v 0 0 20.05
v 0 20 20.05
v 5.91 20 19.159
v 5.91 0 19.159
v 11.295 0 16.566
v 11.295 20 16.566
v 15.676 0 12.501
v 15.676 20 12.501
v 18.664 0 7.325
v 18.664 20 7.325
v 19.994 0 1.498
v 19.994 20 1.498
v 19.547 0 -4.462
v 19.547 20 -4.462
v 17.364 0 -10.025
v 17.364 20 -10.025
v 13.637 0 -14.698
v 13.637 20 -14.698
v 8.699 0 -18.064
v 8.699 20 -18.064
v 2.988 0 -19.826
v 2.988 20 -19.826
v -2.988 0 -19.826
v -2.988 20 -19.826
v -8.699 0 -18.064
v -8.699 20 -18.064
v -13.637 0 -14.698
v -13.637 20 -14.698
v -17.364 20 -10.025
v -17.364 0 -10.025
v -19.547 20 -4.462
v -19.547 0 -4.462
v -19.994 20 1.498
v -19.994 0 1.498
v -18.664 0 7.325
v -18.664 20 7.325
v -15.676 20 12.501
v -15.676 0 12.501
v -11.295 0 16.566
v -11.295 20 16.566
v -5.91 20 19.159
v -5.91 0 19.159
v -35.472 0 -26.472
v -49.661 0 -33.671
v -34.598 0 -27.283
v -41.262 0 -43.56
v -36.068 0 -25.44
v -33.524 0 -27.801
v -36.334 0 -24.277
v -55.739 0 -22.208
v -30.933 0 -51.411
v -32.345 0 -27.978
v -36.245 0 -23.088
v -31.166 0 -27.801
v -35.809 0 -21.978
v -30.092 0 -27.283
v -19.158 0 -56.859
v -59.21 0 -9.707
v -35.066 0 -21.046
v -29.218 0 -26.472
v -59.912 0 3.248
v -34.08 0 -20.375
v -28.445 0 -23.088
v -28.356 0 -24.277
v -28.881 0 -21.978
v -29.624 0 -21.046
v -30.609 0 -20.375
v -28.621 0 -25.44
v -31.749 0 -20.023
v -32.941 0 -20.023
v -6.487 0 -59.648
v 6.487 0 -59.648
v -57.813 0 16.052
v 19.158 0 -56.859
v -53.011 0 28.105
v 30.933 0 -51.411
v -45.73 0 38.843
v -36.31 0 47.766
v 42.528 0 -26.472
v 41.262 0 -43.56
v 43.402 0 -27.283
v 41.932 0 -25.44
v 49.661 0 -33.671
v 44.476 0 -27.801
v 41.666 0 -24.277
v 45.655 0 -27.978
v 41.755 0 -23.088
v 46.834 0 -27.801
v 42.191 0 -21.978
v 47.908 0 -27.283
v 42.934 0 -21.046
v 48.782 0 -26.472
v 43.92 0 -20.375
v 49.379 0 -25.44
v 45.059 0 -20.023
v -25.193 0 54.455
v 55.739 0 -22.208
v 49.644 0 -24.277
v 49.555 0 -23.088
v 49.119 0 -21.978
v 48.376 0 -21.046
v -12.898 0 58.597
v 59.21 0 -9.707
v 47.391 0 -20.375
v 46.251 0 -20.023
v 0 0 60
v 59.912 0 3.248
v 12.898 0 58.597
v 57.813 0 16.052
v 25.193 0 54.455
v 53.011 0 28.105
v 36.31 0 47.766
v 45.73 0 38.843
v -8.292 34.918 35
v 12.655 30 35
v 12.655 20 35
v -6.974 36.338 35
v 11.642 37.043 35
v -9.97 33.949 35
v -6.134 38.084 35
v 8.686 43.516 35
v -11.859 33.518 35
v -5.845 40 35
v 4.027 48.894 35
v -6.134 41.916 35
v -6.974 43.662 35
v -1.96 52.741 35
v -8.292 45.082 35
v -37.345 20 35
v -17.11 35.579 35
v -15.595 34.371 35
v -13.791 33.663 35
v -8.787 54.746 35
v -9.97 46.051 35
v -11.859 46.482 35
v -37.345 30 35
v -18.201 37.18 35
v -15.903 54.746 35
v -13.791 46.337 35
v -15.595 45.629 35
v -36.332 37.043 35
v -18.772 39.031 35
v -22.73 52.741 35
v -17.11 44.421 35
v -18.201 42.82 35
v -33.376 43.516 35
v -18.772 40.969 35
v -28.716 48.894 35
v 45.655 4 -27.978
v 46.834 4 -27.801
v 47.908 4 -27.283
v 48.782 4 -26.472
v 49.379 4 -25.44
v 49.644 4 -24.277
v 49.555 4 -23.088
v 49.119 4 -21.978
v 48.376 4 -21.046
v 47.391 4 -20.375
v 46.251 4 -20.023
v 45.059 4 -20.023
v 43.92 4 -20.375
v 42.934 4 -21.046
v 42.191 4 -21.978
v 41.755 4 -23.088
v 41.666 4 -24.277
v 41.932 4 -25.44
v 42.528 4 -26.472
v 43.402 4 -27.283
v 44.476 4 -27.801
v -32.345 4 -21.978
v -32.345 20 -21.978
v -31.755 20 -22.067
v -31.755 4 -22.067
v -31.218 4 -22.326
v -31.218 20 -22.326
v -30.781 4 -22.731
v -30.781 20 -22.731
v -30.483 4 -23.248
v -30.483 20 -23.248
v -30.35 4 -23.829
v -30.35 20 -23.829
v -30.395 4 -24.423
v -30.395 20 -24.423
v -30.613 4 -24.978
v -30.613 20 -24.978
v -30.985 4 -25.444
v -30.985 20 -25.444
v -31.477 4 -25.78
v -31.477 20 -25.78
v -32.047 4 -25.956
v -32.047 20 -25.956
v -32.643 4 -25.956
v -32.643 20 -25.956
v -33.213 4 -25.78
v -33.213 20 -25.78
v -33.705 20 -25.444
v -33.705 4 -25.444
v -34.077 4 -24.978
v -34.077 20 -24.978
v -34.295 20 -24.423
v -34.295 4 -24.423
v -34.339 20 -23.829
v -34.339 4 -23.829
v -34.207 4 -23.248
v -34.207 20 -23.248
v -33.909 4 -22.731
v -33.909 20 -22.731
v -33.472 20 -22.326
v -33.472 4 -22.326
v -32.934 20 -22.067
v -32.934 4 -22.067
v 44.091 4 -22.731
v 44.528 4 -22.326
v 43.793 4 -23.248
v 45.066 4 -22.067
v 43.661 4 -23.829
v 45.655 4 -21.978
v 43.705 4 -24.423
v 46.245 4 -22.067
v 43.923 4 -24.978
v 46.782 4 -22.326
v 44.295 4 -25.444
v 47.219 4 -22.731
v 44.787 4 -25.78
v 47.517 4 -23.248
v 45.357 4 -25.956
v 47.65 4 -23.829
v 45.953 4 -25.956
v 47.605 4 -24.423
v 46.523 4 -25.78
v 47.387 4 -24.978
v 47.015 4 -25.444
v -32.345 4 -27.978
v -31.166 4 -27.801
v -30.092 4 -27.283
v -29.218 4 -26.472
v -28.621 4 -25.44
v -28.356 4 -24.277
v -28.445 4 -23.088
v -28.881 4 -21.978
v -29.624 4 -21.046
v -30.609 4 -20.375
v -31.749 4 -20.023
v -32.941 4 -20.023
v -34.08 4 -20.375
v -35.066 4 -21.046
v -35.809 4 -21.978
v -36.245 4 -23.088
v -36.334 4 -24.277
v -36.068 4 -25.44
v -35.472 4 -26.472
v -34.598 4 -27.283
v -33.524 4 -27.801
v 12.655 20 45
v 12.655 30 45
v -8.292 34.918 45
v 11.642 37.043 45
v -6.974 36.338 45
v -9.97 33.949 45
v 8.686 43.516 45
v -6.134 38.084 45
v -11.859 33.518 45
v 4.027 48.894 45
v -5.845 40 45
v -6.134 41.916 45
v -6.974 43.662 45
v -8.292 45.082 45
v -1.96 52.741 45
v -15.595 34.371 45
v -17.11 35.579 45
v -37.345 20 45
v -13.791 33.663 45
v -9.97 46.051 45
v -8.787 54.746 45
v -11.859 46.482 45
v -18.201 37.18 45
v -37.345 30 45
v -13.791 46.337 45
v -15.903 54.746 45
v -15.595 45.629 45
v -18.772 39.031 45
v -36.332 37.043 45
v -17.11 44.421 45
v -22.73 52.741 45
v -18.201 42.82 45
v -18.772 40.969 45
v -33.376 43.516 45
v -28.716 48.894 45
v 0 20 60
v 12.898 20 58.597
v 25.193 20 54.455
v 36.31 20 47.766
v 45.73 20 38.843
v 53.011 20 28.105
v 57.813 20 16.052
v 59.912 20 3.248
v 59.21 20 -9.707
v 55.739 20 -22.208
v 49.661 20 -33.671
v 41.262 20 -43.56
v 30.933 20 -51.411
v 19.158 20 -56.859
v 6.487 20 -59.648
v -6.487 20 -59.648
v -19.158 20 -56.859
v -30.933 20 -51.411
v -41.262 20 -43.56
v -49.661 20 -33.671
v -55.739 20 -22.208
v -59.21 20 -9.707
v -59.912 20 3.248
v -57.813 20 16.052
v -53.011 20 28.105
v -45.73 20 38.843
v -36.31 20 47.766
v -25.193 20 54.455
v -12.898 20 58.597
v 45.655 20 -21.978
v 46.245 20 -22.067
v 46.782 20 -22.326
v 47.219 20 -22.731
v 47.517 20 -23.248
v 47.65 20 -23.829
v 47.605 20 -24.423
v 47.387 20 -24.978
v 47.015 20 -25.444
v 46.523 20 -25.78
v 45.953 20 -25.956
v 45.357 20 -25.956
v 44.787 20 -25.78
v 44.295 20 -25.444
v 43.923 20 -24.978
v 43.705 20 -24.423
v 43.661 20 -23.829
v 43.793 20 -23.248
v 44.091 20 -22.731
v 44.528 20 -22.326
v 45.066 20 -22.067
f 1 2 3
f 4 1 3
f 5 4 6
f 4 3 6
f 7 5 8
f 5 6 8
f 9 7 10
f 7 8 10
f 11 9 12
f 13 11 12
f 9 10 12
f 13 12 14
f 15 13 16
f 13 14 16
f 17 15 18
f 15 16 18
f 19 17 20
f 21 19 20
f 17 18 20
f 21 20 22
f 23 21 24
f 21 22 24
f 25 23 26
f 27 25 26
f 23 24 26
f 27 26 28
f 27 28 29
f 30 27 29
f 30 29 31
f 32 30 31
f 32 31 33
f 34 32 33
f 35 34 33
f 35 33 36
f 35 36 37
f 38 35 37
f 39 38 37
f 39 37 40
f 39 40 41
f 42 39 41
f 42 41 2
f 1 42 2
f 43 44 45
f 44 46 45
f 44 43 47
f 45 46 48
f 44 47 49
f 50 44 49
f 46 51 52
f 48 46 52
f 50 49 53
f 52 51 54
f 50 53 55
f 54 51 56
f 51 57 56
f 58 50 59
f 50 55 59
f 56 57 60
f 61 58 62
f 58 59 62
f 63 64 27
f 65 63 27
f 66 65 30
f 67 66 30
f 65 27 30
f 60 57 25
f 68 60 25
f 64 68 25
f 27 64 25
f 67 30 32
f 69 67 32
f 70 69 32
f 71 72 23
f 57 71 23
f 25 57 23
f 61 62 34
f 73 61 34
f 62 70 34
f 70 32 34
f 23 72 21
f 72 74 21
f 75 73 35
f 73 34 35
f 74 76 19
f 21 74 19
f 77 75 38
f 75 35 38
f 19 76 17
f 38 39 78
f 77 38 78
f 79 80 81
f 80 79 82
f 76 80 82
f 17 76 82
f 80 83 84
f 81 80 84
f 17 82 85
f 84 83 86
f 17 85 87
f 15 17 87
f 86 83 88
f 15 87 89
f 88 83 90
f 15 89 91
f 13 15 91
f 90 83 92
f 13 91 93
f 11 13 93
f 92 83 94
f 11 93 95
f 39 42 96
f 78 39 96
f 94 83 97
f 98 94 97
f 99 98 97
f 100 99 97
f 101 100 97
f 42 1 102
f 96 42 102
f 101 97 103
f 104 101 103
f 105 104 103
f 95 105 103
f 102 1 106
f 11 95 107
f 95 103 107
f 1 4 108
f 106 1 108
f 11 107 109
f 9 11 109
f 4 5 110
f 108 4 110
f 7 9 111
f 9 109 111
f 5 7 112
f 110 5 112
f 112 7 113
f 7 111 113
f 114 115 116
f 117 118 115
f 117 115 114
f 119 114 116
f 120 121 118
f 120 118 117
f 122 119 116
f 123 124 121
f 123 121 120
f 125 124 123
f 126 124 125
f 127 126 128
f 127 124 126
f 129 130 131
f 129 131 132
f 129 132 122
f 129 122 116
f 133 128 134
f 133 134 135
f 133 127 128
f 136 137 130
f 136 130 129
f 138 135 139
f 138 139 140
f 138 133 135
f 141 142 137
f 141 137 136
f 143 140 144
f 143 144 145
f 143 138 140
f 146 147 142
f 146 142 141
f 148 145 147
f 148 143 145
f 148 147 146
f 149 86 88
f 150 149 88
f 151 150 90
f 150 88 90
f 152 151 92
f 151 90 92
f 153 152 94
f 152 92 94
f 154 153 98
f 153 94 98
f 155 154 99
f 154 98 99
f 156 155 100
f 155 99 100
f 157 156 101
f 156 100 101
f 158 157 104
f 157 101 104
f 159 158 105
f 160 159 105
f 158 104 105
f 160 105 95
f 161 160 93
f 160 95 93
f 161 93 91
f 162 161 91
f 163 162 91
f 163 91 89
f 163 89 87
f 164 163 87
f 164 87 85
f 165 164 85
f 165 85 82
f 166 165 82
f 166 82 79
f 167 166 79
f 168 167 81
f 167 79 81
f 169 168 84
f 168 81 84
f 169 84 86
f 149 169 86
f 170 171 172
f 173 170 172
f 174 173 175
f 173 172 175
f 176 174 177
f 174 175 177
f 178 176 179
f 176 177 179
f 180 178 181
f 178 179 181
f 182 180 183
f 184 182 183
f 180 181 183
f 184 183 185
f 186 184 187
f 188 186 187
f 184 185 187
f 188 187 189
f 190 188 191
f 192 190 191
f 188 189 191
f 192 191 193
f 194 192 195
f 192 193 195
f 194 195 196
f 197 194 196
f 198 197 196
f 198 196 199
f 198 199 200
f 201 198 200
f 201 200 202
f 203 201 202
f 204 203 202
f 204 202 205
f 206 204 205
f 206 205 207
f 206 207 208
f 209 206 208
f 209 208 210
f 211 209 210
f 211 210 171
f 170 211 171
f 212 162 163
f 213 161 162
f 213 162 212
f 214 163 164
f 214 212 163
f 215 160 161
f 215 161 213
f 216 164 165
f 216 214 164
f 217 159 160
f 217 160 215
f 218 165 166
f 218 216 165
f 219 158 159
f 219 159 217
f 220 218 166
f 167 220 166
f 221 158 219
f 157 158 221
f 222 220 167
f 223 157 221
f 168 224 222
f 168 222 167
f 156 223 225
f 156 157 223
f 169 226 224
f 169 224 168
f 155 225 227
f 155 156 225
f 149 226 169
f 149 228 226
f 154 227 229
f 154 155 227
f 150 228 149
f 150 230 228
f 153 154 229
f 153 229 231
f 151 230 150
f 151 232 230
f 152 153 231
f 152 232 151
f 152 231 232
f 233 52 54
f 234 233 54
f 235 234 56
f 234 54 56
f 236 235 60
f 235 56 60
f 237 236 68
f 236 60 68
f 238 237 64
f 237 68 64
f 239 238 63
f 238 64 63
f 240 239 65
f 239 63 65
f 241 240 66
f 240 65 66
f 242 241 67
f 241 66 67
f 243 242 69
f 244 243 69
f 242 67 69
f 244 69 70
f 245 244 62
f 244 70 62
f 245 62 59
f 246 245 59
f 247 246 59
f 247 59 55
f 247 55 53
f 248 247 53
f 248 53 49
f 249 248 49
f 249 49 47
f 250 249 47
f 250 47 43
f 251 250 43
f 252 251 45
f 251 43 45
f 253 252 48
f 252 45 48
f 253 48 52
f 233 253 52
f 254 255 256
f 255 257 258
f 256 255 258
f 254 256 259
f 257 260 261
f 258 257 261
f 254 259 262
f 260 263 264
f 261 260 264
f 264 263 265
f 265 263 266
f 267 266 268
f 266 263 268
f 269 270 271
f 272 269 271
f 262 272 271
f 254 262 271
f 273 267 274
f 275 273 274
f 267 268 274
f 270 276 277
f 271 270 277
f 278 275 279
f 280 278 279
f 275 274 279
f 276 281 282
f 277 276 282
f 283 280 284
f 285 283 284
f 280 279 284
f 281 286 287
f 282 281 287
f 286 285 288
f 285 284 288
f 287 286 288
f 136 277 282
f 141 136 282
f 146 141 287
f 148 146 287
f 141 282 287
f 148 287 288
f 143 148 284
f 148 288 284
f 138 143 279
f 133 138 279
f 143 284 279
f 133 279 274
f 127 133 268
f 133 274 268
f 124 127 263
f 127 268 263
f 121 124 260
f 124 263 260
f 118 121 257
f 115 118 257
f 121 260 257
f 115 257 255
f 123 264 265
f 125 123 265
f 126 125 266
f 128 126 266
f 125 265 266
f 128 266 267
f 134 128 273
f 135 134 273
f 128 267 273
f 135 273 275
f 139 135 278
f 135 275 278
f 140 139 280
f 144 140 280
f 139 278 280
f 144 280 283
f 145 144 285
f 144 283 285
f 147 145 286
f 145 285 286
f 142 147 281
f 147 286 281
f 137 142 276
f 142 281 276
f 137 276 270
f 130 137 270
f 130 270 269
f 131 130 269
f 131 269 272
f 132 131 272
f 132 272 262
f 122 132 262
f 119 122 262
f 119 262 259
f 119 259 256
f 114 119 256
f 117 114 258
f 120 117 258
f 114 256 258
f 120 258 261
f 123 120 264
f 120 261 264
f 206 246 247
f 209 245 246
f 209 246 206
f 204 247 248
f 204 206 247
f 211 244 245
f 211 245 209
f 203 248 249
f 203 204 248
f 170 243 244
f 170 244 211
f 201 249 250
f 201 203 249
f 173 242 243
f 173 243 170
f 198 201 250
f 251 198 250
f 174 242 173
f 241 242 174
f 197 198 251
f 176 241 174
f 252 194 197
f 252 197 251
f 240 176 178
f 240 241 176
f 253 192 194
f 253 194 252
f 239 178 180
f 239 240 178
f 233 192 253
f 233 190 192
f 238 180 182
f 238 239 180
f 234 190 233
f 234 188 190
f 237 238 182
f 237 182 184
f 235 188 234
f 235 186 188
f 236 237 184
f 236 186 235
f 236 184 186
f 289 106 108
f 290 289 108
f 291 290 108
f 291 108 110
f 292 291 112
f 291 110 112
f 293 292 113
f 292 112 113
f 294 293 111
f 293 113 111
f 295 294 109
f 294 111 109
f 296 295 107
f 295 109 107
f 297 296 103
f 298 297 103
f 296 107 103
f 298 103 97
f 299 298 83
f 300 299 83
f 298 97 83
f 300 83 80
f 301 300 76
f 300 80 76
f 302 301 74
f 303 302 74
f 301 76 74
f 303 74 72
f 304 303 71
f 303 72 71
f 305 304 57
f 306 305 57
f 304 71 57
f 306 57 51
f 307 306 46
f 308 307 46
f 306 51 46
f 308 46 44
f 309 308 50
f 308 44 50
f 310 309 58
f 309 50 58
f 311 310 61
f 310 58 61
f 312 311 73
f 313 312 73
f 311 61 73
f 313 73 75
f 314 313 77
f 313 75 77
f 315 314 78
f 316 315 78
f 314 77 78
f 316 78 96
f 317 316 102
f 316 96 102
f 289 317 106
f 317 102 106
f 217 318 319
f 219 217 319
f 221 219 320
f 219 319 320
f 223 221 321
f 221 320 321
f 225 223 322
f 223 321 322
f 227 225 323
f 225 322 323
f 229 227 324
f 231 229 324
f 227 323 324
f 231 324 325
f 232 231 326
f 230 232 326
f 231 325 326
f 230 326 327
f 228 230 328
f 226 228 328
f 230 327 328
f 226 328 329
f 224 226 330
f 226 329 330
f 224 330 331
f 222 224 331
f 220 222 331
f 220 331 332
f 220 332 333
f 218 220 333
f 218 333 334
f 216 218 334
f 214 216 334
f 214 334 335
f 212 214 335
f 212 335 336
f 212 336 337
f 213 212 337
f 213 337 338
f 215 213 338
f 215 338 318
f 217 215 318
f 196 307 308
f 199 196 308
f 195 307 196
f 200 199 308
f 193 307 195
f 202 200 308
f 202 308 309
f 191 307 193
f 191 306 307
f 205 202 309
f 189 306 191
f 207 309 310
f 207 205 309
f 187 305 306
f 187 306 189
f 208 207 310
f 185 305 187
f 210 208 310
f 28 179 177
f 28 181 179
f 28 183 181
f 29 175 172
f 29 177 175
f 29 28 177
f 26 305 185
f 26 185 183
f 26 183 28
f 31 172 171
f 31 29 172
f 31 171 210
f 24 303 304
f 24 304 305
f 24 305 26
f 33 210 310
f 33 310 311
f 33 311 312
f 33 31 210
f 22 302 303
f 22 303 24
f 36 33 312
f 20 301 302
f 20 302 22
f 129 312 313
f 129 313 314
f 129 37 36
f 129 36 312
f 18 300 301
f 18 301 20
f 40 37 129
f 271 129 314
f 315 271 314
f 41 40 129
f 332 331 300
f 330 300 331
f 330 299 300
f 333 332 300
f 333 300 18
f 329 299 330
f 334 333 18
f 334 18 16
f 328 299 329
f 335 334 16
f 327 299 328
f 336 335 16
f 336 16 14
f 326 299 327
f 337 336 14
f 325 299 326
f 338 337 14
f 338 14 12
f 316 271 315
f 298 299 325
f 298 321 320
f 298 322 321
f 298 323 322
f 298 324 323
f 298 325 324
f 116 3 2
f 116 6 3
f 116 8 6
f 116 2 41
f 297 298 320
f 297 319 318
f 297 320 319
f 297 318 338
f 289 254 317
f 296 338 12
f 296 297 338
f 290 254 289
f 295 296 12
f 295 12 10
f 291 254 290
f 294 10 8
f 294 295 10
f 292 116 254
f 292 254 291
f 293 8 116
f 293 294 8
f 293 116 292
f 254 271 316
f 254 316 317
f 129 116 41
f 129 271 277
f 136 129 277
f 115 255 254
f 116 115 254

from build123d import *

# Parameters (mm, degrees)
SKETCH1_R           = 60
BOSS_EXTRUDE1_DEPTH = 20
BOSS_EXTRUDE2_DEPTH = 10
SKETCH6_R           = 20.05
CUT_EXTRUDE1_DEPTH  = 92.787798753
SKETCH8_R           = 6.5
CUT_EXTRUDE3_DEPTH  = 10
SKETCH9_R           = 2.000000002
CUT_EXTRUDE4_DEPTH  = 20
SKETCH10_R          = 3.999999996
CUT_EXTRUDE5_DEPTH  = 4


with BuildPart() as part:
    # Sketch1 → Boss-Extrude1 (new body)
    with BuildSketch(Plane(origin=(0, 0, 0), x_dir=(1, 0, 0), z_dir=(0, 1, 0))):
        with Locations(Location((0, 0, 0), (0, 0, 270))):
            Circle(SKETCH1_R)
    extrude(amount=BOSS_EXTRUDE1_DEPTH)

    # Sketch2 → Boss-Extrude2 (add)
    with BuildSketch(Plane.XY.offset(45)):
        with BuildLine():
            Line((-37.344891303, 20), (-37.344891303, 30))
            ThreePointArc((-37.344891303, 30), (-12.344891303, 55), (12.655108697, 30))
            Line((12.655108697, 30), (12.655108697, 20))
            Line((12.655108697, 20), (-37.344891303, 20))
        make_face()
    extrude(amount=-BOSS_EXTRUDE2_DEPTH)

    # Sketch6 → Cut-Extrude1 (cut, through all)
    with BuildSketch(Plane(origin=(0, 20, 0), x_dir=(1, 0, 0), z_dir=(0, 1, 0))):
        with Locations(Location((0, 0, 0), (0, 0, 270))):
            Circle(SKETCH6_R)
    extrude(amount=-CUT_EXTRUDE1_DEPTH, mode=Mode.SUBTRACT)

    # Sketch8 → Cut-Extrude3 (cut)
    with BuildSketch(Plane.XY.offset(45)):
        with Locations((-12.344891303, 40)):
            Circle(SKETCH8_R)
    extrude(amount=-CUT_EXTRUDE3_DEPTH, mode=Mode.SUBTRACT)

    # Sketch9 → Cut-Extrude4 (cut)
    with BuildSketch(Plane(origin=(0, 20, 0), x_dir=(1, 0, 0), z_dir=(0, 1, 0))):
        with Locations(Location((45.655108698, 23.978394329, 0), (0, 0, 270))):
            Circle(SKETCH9_R)
        with Locations(Location((-32.344891302, 23.978394329, 0), (0, 0, 270))):
            Circle(SKETCH9_R)
    extrude(amount=-CUT_EXTRUDE4_DEPTH, mode=Mode.SUBTRACT)

    # Sketch10 → Cut-Extrude5 (cut)
    with BuildSketch(Plane.XZ):
        with Locations(Location((45.655108698, -23.978394329, 0), (0, 0, 270))):
            Circle(SKETCH10_R)
        with Locations(Location((-32.344891302, -23.978394329, 0), (0, 0, 270))):
            Circle(SKETCH10_R)
    extrude(amount=-CUT_EXTRUDE5_DEPTH, mode=Mode.SUBTRACT)


solid = part.part
